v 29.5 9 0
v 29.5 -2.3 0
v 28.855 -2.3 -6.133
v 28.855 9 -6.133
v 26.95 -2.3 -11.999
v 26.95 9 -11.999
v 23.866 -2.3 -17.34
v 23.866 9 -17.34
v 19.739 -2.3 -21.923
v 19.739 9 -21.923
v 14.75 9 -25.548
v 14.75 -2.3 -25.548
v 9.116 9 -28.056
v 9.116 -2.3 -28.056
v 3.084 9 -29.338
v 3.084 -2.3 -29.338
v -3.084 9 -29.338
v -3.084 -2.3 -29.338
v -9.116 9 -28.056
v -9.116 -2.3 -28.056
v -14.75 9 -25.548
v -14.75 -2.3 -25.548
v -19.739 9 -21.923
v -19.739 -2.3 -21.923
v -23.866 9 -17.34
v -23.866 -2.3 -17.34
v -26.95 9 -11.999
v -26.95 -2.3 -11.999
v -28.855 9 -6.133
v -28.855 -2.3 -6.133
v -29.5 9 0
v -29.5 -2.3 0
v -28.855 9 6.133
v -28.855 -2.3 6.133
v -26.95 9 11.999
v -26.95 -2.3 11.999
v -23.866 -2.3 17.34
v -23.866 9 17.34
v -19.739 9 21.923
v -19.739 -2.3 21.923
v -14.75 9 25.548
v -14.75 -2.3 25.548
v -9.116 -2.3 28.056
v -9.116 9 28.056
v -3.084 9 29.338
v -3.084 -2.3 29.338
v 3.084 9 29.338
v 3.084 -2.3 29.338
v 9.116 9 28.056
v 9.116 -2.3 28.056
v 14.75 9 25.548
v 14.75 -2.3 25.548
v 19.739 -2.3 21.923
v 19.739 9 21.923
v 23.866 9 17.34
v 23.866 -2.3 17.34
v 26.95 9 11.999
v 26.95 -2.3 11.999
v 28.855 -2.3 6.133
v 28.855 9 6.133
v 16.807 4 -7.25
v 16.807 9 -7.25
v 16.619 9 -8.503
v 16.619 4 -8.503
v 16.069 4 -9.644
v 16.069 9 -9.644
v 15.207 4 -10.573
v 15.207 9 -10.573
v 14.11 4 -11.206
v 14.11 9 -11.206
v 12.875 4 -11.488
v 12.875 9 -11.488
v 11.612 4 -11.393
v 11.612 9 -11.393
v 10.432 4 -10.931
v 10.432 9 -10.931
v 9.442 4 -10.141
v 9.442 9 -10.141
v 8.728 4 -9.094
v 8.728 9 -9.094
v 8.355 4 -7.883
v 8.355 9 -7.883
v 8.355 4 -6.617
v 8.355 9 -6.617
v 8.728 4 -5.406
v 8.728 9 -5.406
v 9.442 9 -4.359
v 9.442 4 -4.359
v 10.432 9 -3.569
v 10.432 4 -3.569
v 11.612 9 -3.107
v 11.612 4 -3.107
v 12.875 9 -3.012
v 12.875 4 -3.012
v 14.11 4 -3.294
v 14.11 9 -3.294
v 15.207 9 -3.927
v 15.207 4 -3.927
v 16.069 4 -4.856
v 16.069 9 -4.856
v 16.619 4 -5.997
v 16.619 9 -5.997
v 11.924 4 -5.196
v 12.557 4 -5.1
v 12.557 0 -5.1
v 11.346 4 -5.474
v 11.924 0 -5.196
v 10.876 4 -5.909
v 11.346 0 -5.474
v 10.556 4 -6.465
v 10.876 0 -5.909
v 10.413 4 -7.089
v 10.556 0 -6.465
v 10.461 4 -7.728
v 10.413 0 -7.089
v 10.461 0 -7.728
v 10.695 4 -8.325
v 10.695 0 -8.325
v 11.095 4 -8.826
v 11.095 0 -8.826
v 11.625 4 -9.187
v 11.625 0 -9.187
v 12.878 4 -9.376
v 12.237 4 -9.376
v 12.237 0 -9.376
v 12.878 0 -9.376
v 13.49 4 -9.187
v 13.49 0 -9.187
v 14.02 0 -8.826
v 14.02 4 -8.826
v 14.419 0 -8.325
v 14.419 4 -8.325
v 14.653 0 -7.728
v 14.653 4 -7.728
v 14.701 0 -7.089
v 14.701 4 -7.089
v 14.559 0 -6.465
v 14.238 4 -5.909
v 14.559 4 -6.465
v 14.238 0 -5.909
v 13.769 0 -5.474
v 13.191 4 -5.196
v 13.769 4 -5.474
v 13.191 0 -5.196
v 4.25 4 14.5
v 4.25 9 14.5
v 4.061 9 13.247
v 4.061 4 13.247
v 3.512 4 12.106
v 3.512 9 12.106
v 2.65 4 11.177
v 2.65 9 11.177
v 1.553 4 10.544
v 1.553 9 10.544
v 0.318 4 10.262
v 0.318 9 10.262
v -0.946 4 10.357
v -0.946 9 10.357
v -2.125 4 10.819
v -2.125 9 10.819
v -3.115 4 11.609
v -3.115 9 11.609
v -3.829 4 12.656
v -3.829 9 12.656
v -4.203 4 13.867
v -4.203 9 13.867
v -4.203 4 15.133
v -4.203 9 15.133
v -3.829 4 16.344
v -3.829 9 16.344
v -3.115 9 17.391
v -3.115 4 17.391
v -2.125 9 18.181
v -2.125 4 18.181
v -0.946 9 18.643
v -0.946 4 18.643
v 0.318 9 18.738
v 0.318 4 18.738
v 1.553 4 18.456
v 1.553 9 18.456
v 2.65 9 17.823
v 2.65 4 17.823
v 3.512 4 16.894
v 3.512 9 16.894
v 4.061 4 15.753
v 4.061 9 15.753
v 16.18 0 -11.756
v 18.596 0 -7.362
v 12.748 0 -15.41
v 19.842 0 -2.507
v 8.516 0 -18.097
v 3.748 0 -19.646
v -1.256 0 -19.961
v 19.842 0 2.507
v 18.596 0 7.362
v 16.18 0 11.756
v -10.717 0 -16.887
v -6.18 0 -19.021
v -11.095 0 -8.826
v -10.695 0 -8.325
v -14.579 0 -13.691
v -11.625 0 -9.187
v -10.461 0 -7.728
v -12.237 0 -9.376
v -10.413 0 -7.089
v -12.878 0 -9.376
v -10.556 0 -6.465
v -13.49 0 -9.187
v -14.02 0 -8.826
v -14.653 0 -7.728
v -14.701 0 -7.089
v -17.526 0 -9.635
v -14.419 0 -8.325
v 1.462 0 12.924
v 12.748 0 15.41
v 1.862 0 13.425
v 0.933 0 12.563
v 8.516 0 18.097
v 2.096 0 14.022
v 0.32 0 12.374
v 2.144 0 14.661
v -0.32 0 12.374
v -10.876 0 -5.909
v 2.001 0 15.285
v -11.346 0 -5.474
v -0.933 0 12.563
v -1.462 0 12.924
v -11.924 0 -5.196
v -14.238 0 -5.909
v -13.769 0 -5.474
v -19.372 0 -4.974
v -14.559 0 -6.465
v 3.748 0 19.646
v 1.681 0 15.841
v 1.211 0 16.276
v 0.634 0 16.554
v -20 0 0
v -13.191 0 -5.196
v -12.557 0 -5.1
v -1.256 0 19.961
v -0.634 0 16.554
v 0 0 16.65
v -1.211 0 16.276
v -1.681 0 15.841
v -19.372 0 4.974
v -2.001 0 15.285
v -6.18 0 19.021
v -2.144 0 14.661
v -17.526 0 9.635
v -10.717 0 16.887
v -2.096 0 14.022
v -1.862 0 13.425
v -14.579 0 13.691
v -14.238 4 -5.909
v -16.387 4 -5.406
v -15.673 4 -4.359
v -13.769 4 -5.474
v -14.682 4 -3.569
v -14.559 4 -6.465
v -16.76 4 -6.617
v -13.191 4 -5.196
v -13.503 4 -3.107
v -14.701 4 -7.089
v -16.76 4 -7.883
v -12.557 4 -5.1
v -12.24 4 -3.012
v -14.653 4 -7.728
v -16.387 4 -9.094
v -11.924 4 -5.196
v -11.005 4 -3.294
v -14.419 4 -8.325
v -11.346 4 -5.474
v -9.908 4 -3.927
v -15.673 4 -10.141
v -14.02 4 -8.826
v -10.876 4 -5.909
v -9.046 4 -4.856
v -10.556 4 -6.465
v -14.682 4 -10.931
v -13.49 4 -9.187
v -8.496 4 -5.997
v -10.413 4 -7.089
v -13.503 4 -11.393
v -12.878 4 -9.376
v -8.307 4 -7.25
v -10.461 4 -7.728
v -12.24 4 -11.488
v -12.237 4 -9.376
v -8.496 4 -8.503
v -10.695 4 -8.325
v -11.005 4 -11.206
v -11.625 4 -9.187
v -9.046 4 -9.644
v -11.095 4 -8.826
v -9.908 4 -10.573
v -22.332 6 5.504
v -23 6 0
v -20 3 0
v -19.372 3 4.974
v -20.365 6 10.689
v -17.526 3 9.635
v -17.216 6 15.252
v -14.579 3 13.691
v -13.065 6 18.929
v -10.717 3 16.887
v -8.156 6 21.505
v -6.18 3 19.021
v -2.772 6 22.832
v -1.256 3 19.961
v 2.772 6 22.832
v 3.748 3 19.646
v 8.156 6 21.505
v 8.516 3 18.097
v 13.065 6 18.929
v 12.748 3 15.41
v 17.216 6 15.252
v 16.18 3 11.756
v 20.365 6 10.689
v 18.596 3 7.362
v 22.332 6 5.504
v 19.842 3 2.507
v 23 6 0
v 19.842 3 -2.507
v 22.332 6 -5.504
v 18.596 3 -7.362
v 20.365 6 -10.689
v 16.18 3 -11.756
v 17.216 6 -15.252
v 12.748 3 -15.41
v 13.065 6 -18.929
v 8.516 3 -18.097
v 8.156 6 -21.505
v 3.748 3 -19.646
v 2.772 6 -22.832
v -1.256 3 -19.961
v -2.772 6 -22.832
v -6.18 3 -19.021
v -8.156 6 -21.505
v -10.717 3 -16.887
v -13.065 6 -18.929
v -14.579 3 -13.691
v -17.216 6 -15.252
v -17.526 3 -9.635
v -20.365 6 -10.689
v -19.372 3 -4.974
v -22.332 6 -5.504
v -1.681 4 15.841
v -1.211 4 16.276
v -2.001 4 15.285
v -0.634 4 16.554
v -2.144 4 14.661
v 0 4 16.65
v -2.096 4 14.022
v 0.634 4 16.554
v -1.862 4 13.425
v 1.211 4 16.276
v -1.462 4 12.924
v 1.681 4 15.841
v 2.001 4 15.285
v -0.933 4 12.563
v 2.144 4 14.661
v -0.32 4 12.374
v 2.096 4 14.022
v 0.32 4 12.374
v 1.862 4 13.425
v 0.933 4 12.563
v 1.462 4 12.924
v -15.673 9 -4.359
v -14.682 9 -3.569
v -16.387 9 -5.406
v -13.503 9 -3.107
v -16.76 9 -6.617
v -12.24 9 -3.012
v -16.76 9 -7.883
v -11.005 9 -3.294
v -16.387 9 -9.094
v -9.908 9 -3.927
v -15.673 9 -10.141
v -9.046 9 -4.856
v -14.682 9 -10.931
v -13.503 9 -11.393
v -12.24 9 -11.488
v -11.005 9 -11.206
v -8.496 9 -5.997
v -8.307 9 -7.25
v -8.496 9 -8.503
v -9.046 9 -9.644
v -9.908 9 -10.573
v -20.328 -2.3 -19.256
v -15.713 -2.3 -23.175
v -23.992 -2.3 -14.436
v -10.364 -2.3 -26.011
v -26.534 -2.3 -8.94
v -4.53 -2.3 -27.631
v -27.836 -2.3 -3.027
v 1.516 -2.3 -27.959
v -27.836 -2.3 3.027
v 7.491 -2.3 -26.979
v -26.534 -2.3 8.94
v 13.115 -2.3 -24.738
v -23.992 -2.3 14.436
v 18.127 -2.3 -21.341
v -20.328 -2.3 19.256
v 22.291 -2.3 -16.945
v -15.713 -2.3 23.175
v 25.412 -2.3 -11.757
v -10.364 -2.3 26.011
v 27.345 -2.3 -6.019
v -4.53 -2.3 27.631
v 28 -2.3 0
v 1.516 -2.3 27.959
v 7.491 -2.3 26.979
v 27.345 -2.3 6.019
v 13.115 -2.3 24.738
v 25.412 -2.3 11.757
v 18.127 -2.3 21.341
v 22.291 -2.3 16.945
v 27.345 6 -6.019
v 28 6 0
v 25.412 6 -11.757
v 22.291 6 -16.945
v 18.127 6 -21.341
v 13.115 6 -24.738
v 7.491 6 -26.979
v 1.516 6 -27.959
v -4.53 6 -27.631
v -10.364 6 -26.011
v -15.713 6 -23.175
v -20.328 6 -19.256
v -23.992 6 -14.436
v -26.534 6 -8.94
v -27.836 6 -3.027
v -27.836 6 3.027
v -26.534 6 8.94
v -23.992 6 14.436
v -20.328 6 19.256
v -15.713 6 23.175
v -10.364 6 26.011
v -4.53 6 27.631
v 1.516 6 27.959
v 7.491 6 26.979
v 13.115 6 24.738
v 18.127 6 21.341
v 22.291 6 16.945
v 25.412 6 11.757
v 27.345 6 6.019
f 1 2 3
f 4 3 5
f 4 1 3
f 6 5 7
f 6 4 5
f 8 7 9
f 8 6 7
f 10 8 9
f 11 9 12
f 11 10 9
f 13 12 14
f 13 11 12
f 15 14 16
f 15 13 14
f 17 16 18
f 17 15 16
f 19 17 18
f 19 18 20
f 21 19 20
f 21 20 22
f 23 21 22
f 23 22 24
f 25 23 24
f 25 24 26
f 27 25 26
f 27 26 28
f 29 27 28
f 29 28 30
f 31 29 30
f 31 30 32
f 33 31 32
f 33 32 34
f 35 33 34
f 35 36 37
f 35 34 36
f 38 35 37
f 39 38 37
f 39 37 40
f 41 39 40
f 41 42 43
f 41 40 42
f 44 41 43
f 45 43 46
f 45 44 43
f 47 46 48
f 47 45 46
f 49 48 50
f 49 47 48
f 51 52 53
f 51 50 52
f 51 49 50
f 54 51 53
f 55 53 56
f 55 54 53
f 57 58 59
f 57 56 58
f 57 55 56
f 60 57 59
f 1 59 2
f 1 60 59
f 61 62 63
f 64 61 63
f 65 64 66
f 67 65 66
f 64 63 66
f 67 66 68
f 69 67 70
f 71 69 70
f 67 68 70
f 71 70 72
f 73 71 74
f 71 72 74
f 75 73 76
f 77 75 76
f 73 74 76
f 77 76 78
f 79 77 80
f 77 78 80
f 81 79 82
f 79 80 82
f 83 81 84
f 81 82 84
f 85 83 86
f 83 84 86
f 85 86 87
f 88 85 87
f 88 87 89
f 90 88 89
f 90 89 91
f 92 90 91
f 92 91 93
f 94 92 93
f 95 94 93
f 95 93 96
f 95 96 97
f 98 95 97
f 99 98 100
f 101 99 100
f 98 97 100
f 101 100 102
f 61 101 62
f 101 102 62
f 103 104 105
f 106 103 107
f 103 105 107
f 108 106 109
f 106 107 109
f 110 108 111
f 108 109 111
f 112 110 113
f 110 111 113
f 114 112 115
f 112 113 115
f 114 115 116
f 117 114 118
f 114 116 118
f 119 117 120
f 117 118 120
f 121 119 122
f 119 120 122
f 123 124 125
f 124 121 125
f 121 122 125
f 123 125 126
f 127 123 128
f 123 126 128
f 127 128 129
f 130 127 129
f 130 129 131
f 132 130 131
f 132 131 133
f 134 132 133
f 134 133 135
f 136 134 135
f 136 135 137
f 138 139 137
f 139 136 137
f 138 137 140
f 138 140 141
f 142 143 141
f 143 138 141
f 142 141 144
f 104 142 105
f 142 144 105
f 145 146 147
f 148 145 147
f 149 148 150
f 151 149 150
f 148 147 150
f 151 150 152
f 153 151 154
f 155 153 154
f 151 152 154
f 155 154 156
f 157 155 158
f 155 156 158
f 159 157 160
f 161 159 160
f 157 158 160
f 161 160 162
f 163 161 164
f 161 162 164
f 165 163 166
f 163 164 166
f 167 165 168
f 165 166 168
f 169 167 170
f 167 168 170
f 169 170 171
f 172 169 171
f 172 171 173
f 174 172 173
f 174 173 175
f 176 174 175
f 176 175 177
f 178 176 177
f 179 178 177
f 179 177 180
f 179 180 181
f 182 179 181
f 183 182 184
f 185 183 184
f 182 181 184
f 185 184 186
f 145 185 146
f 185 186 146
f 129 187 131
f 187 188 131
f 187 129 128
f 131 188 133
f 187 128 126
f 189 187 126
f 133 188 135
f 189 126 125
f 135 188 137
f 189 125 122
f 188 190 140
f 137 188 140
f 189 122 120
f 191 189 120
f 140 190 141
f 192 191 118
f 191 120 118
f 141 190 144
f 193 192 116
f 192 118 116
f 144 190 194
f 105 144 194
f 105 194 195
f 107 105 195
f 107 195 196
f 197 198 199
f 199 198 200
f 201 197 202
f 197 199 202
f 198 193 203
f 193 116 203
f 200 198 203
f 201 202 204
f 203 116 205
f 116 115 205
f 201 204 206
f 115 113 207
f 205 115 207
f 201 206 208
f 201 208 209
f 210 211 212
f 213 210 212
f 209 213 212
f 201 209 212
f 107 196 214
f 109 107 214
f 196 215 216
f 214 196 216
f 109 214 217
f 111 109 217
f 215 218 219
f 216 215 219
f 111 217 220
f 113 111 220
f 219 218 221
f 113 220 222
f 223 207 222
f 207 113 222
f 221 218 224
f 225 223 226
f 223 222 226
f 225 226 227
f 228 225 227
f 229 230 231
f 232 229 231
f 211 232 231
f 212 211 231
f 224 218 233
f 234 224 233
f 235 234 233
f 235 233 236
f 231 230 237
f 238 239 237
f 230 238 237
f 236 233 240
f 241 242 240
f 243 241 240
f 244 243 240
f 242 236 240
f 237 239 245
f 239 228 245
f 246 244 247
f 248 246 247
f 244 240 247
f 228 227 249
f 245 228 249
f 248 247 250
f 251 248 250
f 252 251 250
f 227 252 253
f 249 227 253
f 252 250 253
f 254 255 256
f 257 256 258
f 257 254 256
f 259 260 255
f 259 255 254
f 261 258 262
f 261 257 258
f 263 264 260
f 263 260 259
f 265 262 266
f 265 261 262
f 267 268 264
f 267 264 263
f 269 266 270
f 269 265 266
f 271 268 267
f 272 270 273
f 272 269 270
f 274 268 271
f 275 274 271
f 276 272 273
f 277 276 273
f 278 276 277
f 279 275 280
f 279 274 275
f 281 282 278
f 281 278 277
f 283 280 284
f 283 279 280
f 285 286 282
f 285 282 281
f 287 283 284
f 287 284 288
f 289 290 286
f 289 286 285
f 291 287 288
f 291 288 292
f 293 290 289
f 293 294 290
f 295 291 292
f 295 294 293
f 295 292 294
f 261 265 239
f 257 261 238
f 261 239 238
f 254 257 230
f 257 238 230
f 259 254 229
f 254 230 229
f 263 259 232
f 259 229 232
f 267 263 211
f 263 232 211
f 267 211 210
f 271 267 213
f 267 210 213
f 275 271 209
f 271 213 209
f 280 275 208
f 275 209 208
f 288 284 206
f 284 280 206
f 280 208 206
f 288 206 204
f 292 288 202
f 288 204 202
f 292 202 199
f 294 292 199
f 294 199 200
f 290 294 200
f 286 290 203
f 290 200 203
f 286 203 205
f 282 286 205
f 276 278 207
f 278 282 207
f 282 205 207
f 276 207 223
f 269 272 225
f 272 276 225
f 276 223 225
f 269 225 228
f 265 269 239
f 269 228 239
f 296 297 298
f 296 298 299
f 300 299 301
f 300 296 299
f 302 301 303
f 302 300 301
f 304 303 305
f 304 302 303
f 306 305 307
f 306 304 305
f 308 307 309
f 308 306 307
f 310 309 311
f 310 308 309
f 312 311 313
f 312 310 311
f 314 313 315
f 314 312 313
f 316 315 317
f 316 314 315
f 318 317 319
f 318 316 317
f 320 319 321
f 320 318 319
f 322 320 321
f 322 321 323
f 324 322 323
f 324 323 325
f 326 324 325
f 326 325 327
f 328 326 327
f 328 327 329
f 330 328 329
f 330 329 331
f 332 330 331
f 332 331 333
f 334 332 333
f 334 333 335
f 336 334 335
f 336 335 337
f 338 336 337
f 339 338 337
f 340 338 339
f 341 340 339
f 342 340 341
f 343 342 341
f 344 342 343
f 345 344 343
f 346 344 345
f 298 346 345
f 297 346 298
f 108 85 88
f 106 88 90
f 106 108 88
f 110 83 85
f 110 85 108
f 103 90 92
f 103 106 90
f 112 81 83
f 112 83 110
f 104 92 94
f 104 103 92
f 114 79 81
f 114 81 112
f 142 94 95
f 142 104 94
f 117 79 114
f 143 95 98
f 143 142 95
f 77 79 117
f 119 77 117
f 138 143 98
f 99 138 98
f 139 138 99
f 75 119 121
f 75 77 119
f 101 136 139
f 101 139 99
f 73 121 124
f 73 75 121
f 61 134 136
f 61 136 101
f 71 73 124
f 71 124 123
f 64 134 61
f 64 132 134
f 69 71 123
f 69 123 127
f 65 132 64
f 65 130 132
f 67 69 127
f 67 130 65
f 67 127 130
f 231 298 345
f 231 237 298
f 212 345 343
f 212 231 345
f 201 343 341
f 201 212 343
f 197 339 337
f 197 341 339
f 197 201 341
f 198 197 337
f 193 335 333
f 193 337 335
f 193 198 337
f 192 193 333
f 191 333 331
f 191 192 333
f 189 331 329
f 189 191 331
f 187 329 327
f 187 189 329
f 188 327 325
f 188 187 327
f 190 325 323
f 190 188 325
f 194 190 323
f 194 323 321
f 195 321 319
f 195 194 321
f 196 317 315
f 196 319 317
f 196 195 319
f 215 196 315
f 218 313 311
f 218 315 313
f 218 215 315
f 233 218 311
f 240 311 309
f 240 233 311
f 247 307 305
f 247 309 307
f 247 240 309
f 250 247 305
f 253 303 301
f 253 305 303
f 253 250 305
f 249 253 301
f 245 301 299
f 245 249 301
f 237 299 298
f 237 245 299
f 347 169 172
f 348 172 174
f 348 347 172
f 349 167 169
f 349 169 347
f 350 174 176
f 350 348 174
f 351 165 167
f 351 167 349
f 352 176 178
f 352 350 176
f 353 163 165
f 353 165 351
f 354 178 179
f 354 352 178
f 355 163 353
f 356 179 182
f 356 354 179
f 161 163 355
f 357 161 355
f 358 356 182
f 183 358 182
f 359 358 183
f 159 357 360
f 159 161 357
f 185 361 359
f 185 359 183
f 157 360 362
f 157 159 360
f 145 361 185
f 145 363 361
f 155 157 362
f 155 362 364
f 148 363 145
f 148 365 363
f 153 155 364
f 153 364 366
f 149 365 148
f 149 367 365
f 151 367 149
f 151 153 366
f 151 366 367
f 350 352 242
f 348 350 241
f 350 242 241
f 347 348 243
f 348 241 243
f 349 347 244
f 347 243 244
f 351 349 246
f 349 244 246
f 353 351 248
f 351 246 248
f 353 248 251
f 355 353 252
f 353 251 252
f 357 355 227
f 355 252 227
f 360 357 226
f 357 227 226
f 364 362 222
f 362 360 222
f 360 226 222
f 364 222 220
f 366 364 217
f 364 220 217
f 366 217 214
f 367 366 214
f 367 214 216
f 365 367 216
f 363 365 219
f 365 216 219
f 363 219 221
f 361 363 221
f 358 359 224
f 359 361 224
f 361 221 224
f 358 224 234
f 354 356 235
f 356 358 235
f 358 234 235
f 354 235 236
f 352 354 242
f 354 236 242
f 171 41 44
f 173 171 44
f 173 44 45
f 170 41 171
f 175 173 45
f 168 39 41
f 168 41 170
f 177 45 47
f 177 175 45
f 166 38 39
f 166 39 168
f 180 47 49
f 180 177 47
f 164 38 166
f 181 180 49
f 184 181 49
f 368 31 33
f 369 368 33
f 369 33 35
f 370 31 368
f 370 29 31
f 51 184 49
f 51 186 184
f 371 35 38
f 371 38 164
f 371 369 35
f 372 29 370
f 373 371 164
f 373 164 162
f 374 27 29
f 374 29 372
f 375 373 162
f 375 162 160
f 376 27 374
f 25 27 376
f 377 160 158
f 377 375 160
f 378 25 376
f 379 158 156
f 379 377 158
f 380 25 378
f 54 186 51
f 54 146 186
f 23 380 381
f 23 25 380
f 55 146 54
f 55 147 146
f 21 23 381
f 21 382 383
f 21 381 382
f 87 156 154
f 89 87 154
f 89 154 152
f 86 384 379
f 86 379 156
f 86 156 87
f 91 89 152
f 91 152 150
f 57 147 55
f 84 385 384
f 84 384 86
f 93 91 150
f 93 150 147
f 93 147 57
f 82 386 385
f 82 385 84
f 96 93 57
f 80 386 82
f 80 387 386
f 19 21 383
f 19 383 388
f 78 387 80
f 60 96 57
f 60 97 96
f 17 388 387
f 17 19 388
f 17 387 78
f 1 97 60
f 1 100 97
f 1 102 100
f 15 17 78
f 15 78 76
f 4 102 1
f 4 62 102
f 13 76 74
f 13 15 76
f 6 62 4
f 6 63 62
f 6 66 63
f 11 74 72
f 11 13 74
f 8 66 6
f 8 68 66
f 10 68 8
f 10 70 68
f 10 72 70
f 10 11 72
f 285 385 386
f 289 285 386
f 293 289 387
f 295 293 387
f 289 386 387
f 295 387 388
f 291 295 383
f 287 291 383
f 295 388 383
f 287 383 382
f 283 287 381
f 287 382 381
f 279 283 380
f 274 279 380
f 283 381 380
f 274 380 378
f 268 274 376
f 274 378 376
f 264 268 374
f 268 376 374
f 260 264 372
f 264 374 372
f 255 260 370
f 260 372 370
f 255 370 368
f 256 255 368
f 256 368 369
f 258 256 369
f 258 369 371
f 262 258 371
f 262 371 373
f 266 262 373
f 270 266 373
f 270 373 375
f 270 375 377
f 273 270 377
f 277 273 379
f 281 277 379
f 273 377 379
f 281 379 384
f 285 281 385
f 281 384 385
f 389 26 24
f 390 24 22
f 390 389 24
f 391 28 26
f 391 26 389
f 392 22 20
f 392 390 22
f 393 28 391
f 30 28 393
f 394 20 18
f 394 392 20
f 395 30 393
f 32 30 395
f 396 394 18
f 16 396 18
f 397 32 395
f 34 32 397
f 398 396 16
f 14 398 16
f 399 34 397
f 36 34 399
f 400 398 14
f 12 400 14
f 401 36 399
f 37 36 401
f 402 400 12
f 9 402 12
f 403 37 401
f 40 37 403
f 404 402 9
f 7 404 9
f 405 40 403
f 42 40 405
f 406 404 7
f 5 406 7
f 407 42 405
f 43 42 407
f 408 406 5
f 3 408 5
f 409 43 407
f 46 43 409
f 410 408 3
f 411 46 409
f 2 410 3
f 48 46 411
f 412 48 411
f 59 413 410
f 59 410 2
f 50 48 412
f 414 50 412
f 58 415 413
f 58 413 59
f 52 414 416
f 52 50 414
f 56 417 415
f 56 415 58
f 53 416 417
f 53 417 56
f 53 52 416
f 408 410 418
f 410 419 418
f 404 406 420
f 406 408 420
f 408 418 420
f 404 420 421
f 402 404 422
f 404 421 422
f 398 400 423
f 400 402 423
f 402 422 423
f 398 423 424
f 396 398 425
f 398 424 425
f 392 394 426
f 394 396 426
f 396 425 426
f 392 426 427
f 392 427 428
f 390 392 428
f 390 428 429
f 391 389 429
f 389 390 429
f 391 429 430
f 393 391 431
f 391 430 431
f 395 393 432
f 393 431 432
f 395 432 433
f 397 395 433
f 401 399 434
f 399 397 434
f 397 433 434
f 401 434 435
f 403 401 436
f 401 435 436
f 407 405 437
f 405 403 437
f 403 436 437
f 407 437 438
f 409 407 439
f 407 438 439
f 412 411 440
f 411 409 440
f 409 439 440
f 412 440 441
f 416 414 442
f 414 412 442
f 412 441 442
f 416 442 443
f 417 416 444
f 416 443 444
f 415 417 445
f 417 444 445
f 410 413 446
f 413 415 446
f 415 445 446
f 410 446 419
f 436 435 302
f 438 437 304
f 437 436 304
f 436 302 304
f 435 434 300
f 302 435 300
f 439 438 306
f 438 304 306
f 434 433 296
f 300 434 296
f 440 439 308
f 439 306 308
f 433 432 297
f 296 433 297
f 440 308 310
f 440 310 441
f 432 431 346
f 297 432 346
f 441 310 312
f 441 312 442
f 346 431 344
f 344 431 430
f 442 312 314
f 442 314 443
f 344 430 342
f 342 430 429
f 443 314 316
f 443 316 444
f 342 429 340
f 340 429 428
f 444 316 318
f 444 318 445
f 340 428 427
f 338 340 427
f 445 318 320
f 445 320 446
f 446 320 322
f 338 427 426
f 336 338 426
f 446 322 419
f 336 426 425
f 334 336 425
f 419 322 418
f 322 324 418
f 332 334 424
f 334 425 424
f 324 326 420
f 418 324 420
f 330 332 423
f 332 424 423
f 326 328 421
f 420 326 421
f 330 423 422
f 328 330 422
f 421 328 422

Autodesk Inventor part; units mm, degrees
ref_plane "YZ Plane" through (0, 0, 0) normal (1, 0, 0) x (0, 1, 0)
ref_plane "XZ Plane" through (0, 0, 0) normal (0, 1, 0) x (-1, 0, 0)
ref_plane "XY Plane" through (0, 0, 0) normal (0, 0, 1) x (1, 0, 0)
sketch "Sketch1" plane through (0, 0, 0) normal (0, 1, 0) x (-1, 0, 0)
  circle A0 centre (0, 0) radius 20
  dimension "d0" = 40
extrude "Extrusion1" add sketch "Sketch1" along normal blind 6
sketch "Sketch2" plane through (0, 6, 0) normal (0, 1, 0) x (1, 0, 0)
  circle A0 centre (0, 0) radius 29.5
  dimension "d3" = 59
extrude "Extrusion2" add sketch "Sketch2" along normal blind 3
sketch "Sketch3" plane through (0, 6, 0) normal (0, -1, 0) x (1, 0, 0)
  circle A0 centre (0, 0) radius 29.5 projected
  circle A1 centre (0, 0) radius 28
  dimension "d6" = 56
extrude "Extrusion3" add sketch "Sketch3" along normal blind 8.3
sketch "Sketch4" plane through (0, 9, 0) normal (0, 1, 0) x (1, 0, 0)
  circle A0 centre (0, 0) radius 14.5 construction
  line L0 (0, 0) -> (0, -14.5) construction
  point P0 (12.5574, 7.25)
  point P1 (-12.5574, 7.25)
  dimension "d9" = 29
  dimension "d12" = 360
hole "Hole1" at (0, 9, 14.5) at (12.5574, 9, -7.25) at (-12.5574, 9, -7.25) direction (0, -1, 0) diameter 4.3 end through all
chamfer "Chamfer1" distance 3 angle 45 1 edges at (20, 6, 0)
sketch "Sketch5" plane through (0, 9, 0) normal (0, 1, 0) x (1, 0, 0)
  circle A0 centre (0, -14.5) radius 2.15 projected
  circle A1 centre (-12.5574, 7.25) radius 2.15 projected
  circle A2 centre (12.5574, 7.25) radius 2.15 projected
  circle A3 centre (0, -14.5) radius 4.25
  circle A4 centre (-12.5574, 7.25) radius 4.25
  circle A5 centre (12.5574, 7.25) radius 4.25
  point P0 (0, 0)
  dimension "d24" = 8.5
  dimension "d25" = 8.5
  dimension "d26" = 8.5
extrude "Extrusion4" cut sketch "Sketch5" against normal blind 5
equation "\"d25\" = d24"
equation "\"d26\" = d24"
properties part number "Arm - slew column C"
